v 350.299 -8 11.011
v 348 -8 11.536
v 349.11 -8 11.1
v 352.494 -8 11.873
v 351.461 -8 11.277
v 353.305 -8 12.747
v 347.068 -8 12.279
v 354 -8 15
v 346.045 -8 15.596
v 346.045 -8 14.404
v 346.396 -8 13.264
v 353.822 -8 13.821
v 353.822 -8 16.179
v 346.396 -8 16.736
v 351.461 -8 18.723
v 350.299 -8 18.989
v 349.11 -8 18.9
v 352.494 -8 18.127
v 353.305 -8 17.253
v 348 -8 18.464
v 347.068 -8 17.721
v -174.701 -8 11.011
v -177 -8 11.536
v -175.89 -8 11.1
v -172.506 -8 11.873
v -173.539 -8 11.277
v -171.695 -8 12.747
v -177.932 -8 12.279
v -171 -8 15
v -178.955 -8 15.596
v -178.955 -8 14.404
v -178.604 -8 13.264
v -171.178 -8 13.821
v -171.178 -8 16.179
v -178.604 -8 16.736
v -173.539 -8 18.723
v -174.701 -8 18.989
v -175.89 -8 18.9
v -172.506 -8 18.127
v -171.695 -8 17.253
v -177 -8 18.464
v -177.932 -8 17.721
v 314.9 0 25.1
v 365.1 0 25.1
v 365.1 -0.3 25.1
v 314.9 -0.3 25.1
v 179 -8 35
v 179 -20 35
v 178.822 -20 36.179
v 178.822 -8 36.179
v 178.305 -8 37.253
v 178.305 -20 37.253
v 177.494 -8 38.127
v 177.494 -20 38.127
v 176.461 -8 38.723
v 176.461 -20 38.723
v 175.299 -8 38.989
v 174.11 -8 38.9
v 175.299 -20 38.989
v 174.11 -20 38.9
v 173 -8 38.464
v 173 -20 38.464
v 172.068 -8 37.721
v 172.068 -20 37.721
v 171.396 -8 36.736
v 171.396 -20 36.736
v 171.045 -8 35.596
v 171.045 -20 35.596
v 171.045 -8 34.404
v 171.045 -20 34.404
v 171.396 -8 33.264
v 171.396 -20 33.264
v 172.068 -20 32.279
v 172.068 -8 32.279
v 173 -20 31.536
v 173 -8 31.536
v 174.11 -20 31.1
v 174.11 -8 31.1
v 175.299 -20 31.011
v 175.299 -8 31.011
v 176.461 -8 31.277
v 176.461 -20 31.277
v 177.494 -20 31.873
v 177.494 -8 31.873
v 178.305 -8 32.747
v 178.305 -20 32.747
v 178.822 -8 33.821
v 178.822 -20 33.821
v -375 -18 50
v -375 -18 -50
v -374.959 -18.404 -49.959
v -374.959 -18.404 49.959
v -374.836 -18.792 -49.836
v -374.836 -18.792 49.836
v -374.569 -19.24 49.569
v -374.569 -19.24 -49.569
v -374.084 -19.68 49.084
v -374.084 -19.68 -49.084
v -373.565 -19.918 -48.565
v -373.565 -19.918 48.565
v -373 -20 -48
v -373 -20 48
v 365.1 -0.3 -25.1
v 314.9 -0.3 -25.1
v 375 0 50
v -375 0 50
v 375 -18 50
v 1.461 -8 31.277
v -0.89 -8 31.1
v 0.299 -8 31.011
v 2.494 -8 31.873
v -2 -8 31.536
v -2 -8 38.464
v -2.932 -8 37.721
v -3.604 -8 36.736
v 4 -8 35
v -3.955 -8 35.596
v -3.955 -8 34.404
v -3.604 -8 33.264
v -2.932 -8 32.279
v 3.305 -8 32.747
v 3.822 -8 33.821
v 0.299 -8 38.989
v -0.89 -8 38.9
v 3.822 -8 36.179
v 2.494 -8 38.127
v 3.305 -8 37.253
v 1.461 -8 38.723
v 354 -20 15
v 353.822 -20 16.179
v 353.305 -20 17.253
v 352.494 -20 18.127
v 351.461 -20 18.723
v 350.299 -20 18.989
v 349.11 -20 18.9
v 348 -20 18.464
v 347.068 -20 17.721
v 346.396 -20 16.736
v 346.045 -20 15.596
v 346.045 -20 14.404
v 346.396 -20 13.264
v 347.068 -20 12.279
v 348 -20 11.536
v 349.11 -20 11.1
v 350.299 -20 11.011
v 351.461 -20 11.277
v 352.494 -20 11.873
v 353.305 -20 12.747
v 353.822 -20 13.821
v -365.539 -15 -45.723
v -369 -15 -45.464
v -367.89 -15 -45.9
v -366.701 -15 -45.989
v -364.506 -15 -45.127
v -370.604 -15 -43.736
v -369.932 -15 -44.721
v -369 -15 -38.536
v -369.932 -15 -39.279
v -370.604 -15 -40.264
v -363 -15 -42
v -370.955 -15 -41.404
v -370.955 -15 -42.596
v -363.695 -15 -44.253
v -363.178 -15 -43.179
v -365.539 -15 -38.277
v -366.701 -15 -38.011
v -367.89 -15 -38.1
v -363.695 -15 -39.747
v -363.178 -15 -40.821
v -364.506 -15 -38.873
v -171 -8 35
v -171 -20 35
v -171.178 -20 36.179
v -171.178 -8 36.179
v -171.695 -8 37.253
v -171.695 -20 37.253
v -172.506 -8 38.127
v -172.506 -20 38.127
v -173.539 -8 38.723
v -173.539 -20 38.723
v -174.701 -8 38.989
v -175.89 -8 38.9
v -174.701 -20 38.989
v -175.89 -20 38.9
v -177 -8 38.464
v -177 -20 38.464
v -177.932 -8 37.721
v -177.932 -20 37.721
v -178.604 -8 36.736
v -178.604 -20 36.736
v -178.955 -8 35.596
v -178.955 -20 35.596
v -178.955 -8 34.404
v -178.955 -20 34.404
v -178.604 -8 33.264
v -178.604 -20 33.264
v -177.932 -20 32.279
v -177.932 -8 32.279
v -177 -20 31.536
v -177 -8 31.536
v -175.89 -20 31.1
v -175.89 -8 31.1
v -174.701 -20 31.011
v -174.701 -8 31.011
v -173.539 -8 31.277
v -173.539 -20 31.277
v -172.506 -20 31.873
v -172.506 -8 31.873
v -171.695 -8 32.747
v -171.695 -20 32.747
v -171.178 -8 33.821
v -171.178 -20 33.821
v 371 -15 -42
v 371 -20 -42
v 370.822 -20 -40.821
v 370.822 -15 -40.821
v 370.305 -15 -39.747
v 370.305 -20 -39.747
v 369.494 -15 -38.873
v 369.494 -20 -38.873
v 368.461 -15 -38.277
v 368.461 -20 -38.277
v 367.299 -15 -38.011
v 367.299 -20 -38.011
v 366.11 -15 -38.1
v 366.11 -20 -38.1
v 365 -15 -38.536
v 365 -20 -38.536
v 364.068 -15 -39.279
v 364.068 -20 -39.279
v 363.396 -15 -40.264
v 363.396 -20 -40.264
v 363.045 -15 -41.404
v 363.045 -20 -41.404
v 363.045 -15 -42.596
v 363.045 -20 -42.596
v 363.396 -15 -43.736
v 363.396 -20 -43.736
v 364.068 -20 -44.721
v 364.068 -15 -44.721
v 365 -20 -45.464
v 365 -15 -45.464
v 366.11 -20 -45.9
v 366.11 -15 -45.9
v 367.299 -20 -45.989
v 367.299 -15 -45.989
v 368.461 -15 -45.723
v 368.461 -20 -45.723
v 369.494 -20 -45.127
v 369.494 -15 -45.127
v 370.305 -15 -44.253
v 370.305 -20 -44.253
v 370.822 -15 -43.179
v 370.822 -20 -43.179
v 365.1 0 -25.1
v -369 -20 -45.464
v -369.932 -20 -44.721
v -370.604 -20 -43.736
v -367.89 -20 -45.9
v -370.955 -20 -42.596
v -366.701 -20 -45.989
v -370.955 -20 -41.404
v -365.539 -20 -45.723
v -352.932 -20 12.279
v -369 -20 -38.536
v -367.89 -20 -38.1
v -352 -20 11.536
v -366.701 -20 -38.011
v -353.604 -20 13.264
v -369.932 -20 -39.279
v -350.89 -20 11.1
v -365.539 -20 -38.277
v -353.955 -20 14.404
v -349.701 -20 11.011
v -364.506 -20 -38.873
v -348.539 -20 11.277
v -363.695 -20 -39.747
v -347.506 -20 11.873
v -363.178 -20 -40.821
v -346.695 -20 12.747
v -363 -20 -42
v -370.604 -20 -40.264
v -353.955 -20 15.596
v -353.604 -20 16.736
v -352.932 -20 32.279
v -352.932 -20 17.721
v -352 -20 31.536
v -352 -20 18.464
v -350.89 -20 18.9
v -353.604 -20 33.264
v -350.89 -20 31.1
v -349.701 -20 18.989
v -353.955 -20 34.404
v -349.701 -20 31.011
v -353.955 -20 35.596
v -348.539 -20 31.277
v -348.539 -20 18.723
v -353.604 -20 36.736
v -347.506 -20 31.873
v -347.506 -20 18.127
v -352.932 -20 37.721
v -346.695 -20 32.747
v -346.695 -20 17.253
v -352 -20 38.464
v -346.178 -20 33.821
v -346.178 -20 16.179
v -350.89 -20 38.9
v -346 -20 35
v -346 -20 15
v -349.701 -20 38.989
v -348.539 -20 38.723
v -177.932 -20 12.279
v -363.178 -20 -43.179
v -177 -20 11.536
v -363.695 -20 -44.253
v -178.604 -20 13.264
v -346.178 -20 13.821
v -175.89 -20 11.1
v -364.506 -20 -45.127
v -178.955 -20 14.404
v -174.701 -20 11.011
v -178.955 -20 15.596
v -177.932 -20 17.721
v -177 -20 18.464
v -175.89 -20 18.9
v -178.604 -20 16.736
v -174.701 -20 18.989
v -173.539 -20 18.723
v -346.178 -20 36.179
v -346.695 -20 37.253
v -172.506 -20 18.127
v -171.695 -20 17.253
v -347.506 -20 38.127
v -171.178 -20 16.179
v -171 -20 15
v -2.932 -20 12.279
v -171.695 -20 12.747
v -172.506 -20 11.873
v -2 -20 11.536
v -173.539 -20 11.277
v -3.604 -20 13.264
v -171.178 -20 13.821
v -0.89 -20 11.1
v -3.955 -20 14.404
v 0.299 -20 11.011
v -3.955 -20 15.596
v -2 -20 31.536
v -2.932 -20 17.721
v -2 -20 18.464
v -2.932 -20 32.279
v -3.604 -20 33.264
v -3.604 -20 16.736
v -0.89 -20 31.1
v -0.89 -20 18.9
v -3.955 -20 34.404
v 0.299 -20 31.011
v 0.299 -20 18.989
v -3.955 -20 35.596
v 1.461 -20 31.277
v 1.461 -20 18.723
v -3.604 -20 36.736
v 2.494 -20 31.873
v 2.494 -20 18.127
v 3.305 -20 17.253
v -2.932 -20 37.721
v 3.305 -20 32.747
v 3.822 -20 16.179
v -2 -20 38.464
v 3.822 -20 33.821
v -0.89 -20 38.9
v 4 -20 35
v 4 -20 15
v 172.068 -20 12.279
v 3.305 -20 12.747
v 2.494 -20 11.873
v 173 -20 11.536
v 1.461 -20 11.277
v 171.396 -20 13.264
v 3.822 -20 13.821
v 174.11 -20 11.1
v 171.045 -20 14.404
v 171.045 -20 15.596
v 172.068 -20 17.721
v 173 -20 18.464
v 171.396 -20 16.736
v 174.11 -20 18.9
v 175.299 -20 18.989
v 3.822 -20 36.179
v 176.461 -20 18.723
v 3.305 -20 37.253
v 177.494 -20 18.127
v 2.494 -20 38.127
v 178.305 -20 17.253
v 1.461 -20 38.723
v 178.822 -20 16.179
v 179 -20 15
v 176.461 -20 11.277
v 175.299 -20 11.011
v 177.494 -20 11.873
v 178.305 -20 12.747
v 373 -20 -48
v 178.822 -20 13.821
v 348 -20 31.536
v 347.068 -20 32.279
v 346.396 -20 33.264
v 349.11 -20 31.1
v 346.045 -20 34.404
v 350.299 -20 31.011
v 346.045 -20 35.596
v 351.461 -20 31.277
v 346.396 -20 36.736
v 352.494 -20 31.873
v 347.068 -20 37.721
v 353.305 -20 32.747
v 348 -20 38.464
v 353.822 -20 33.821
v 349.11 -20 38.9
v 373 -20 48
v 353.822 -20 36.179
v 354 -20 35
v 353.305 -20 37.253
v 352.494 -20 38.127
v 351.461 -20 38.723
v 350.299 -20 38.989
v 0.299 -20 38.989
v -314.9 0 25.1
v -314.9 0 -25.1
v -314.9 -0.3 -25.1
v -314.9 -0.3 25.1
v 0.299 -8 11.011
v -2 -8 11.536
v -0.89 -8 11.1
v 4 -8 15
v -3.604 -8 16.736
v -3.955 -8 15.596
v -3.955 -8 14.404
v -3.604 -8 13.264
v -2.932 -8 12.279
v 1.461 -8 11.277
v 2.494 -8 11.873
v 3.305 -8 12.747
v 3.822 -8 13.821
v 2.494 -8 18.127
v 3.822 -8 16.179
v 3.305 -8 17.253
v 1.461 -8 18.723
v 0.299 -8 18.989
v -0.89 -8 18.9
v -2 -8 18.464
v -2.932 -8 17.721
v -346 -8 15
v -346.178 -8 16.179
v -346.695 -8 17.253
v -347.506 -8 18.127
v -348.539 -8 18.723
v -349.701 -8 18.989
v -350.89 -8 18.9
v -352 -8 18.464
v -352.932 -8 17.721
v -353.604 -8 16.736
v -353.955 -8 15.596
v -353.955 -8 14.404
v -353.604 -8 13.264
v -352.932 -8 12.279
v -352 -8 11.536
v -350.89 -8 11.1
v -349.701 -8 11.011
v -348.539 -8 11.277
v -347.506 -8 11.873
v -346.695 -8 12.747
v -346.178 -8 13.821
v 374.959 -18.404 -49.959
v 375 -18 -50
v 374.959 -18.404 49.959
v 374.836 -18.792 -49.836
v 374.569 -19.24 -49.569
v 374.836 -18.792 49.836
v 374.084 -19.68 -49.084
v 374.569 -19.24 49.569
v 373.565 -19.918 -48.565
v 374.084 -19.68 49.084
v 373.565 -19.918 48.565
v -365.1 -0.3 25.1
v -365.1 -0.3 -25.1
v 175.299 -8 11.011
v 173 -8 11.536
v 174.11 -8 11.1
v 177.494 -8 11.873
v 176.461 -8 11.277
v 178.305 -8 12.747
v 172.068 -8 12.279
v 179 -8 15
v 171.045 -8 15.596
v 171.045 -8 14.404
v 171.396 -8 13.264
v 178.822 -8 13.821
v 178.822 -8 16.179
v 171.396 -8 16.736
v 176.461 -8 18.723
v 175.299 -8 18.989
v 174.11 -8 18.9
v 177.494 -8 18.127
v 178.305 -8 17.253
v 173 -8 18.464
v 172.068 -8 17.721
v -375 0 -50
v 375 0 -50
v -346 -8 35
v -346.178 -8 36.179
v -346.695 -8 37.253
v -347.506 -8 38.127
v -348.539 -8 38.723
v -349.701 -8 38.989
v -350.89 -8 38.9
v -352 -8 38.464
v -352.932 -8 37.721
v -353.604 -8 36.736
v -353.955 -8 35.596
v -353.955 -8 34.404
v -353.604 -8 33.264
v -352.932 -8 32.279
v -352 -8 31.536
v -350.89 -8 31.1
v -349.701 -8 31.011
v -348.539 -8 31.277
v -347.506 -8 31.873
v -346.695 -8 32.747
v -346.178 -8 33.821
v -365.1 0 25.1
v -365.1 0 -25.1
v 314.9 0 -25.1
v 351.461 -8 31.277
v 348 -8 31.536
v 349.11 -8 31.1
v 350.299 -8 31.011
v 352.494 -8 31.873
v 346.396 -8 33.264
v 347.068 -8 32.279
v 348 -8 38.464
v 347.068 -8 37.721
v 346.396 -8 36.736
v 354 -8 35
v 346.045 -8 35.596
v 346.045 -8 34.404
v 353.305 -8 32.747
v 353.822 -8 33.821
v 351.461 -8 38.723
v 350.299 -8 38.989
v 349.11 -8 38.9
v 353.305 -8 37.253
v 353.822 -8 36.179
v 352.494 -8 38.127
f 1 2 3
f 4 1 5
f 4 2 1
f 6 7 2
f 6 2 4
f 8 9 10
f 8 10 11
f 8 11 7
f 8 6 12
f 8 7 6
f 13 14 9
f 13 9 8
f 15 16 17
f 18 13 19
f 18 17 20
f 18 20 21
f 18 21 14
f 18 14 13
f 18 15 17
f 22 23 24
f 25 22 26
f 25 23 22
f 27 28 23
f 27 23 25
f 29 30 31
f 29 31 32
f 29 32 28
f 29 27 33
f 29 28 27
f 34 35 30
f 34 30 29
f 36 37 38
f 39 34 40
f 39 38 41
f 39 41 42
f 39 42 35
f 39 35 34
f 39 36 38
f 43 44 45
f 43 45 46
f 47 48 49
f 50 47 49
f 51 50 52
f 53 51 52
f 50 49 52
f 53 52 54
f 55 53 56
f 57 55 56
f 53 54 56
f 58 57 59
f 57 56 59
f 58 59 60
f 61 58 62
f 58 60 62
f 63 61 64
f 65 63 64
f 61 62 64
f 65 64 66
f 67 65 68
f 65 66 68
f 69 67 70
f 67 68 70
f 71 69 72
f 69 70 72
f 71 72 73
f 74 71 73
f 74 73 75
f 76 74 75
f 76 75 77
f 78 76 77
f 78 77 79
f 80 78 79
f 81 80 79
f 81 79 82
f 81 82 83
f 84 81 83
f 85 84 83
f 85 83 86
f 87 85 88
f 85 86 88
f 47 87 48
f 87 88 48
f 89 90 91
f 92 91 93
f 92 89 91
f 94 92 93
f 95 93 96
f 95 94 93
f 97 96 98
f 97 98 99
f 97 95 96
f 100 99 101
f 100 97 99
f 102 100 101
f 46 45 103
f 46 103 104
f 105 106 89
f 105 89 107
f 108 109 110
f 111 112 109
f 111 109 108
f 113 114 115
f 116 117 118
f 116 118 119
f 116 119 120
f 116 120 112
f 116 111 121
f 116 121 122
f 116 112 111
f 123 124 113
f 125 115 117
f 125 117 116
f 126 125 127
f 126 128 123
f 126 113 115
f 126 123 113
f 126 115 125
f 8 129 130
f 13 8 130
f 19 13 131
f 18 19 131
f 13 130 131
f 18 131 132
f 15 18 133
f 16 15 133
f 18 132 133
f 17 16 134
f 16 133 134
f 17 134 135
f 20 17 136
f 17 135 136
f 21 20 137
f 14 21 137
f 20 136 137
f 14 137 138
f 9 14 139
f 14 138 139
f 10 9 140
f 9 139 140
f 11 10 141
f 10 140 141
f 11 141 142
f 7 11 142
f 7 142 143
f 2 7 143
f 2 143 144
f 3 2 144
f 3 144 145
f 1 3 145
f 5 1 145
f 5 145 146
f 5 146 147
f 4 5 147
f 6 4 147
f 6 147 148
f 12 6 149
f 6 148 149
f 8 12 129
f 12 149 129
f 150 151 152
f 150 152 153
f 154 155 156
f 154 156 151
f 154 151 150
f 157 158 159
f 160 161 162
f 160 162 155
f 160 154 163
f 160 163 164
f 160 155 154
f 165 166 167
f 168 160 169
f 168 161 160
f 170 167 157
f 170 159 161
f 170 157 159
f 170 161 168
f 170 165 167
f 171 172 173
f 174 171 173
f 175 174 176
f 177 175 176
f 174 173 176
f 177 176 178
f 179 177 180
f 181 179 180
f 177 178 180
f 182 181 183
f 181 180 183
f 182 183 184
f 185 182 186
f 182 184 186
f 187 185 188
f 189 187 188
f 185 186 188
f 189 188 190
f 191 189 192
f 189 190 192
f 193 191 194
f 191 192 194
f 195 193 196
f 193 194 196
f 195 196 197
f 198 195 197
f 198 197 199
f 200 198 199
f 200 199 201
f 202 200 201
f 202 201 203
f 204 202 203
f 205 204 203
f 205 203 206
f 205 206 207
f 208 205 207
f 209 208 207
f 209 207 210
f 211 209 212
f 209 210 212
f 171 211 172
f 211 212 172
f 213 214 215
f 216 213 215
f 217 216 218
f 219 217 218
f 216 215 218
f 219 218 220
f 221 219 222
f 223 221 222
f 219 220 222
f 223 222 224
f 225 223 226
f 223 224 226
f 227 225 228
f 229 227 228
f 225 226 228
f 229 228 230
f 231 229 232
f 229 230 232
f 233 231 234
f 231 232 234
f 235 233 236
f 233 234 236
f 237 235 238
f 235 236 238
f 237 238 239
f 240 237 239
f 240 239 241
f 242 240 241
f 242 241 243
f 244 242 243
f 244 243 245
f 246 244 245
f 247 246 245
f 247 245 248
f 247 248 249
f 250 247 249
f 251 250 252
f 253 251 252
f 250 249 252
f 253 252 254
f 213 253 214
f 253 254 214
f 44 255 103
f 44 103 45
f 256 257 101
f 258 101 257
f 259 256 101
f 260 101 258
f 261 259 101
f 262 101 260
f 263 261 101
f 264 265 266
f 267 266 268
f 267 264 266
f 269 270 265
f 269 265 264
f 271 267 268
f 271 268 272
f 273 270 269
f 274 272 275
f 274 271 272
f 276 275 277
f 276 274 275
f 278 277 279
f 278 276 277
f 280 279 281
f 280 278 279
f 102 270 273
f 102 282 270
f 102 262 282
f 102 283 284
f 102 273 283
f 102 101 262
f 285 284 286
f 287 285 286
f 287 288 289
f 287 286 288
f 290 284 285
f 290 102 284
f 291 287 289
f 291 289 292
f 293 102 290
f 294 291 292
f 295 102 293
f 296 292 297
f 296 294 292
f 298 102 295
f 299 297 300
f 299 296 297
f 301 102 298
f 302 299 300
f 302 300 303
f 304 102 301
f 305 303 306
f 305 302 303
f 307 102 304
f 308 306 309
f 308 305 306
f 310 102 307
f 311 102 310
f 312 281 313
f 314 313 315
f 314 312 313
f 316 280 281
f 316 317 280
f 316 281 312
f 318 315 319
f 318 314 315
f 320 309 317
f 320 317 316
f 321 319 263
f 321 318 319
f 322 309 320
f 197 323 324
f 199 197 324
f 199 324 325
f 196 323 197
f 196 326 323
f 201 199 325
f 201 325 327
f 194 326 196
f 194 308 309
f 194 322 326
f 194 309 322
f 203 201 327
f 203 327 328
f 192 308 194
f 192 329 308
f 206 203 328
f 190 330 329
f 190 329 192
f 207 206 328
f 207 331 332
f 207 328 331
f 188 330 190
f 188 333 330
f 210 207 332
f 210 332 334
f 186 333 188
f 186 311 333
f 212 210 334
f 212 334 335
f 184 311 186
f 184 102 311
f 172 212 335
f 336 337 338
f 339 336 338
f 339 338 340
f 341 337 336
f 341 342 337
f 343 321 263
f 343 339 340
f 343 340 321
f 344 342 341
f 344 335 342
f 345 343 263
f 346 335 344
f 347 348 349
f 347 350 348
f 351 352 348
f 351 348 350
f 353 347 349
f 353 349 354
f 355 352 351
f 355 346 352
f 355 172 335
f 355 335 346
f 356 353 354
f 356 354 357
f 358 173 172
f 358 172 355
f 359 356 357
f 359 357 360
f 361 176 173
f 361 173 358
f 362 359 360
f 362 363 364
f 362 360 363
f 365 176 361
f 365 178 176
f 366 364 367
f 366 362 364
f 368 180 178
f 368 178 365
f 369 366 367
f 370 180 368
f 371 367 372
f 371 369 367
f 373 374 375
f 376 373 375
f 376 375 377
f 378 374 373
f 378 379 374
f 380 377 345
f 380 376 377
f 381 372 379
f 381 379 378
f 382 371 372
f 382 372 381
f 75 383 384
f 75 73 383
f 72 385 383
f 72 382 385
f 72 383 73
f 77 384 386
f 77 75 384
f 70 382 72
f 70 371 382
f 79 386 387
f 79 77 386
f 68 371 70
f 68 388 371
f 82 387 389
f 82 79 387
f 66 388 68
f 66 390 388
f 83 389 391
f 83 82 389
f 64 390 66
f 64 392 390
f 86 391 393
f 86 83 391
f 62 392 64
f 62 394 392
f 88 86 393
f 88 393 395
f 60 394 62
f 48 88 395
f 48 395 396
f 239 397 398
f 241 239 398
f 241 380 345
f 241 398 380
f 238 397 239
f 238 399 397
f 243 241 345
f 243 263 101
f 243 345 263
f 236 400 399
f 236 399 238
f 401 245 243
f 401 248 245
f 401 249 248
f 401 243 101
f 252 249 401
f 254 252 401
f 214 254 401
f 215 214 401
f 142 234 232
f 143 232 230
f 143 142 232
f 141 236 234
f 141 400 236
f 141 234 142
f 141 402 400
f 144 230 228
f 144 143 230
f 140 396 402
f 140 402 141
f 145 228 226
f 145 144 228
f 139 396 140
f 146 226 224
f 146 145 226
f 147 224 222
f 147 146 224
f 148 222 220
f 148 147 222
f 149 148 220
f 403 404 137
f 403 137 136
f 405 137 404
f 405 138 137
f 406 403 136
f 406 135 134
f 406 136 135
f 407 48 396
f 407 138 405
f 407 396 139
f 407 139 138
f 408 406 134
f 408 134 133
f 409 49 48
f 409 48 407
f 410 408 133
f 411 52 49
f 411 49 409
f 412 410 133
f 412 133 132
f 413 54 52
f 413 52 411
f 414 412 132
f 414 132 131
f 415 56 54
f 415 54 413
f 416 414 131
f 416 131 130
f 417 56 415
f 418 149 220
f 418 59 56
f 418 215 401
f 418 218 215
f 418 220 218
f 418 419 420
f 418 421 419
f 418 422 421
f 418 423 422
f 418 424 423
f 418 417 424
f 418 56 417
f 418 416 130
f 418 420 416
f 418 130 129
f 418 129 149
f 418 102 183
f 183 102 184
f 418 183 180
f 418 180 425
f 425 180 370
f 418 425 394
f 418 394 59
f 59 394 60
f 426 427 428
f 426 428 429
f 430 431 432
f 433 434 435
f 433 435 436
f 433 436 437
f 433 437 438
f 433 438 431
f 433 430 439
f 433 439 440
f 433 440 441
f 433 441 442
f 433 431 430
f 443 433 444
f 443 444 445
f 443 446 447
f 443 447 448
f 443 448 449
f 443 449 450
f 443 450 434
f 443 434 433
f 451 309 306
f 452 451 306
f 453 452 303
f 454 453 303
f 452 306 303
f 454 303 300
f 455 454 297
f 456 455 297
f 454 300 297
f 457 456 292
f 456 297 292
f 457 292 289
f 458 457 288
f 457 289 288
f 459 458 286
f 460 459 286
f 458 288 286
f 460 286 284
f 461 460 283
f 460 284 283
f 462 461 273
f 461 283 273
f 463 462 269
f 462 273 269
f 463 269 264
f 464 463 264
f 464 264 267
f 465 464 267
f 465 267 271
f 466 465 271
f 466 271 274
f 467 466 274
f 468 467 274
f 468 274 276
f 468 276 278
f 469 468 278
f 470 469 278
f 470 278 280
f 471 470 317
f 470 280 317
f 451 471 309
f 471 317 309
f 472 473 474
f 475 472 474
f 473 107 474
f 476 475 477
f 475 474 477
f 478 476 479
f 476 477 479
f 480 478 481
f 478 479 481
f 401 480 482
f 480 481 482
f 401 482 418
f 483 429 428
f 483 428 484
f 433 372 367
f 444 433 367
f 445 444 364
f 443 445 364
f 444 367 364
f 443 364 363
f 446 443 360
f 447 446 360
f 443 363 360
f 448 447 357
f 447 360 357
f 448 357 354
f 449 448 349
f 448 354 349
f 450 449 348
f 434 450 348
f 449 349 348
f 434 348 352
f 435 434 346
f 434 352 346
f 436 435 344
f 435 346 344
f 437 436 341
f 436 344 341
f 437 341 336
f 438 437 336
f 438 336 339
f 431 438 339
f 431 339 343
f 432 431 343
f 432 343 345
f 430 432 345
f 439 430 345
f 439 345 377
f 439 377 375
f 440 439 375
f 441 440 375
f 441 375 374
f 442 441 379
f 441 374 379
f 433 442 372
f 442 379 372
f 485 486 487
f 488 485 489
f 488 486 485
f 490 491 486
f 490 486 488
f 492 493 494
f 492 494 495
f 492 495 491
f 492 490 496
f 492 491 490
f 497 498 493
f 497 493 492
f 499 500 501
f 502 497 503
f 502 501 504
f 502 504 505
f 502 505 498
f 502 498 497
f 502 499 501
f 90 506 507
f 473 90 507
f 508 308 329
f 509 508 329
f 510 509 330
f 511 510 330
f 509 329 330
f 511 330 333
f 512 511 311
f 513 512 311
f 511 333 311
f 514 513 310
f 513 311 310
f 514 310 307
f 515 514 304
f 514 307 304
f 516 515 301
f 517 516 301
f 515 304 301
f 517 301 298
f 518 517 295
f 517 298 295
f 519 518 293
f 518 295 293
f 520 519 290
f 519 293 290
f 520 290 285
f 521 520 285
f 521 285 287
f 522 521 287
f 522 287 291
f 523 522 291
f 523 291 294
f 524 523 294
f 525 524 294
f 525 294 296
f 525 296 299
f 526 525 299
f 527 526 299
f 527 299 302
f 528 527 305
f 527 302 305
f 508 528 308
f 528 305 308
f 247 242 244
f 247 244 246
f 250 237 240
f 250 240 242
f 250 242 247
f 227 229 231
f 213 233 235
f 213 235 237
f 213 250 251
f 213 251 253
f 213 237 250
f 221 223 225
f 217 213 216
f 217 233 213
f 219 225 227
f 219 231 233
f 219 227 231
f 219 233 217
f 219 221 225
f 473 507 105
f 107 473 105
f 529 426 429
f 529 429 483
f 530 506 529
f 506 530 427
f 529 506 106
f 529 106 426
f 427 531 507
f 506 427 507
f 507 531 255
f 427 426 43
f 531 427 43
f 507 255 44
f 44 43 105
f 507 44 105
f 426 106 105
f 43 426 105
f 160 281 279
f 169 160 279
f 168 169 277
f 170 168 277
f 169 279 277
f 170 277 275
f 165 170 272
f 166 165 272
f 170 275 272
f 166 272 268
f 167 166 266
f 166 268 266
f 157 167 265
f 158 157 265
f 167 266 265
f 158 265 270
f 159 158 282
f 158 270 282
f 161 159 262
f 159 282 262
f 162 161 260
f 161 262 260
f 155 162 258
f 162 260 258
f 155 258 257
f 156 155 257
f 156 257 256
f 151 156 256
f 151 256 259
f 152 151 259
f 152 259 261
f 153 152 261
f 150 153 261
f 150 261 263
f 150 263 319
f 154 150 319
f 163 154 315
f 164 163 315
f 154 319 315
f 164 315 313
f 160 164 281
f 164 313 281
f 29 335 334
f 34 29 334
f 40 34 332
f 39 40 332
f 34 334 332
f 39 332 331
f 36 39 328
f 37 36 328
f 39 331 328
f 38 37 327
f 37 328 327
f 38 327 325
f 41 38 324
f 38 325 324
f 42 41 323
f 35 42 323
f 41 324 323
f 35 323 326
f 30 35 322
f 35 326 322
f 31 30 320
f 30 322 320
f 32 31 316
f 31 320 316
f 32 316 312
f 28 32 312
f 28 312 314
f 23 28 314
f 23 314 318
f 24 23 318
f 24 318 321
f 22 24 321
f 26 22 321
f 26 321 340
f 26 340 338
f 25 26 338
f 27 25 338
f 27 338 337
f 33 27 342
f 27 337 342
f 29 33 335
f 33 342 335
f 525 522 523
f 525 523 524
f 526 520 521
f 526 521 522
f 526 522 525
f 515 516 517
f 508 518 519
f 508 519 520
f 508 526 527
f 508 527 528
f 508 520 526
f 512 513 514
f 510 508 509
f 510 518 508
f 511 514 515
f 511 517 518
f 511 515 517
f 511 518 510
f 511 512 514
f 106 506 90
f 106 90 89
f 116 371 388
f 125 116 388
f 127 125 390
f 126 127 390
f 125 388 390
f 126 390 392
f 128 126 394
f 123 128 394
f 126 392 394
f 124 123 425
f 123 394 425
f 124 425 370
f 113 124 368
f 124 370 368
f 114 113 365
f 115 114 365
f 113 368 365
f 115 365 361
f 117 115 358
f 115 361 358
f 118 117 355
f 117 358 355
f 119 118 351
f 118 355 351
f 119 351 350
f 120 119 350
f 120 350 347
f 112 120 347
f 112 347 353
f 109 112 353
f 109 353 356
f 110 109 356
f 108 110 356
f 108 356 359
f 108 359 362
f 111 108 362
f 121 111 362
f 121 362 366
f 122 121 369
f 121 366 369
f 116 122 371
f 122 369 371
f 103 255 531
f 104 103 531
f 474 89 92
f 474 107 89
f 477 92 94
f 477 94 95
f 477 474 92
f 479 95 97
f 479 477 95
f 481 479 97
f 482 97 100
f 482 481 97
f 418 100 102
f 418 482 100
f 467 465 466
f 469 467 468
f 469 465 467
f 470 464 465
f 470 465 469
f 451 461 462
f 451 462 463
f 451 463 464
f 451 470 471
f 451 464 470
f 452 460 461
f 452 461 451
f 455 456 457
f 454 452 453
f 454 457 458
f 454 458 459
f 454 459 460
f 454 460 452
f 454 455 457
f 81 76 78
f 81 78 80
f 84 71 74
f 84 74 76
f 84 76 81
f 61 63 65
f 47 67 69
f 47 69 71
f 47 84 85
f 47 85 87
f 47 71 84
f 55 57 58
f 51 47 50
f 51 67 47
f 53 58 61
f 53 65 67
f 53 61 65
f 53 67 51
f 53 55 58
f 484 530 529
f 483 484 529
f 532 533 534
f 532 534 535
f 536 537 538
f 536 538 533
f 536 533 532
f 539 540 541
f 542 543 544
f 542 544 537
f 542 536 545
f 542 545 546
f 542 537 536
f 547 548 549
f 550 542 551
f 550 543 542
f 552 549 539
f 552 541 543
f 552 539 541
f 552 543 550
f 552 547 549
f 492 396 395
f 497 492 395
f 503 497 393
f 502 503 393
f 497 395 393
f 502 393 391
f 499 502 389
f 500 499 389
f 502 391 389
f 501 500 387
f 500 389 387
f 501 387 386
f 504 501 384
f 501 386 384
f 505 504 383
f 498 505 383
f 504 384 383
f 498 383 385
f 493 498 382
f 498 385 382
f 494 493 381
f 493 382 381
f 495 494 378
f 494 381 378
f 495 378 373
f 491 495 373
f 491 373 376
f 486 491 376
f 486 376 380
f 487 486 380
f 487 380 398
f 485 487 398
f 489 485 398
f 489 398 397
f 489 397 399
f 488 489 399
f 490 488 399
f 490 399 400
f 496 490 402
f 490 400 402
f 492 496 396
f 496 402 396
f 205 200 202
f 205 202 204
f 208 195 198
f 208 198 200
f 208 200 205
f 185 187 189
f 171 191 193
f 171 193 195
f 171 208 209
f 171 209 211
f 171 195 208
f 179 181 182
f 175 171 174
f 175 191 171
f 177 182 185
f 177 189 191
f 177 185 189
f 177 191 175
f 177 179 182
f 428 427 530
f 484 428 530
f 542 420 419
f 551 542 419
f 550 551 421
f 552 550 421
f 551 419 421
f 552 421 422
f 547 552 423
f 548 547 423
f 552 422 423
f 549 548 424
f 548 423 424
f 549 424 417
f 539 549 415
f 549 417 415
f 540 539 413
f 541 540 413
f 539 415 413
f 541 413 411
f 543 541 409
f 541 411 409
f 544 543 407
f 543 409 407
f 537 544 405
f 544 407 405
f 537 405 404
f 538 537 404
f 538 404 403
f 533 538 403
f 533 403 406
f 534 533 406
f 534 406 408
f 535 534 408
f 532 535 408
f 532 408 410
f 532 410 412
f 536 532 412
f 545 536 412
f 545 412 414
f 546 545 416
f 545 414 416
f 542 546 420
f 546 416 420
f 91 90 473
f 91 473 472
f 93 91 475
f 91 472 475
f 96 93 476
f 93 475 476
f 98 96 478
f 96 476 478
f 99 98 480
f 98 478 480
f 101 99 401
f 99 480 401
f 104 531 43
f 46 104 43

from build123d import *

# Parameters (mm, degrees)
F0_W     = 750
F0_H     = 100
F1_DEPTH = 20
F2_R     = 2
F3_R     = 4
F4_DEPTH = 12
F5_R     = 4
F6_DEPTH = 5
F7_W     = 50.2
F7_H     = 50.2
F8_DEPTH = 0.3


with BuildPart() as f1:
    # F0 (on Front) → F1 (new body)
    with BuildSketch(Plane.XZ):
        Rectangle(F0_W, F0_H)
    extrude(amount=F1_DEPTH)

    # F2
    f2_edges = [f1.edges().sort_by_distance(p)[0] for p in [
        (0, -20, -50),
        (375, -20, 0),
        (0, -20, 50),
        (-375, -20, 0),
    ]]
    fillet(f2_edges, radius=F2_R)

    # F3 (on face) → F4 (cut)
    with BuildSketch(Plane.XZ.offset(20)):
        with Locations((-350, 35)):
            Circle(F3_R)
        with Locations((-350, 15)):
            Circle(F3_R)
        with Locations((-175, 15)):
            Circle(F3_R)
        with Locations((-175, 35)):
            Circle(F3_R)
        with Locations((0, 35)):
            Circle(F3_R)
        with Locations((0, 15)):
            Circle(F3_R)
        with Locations((175, 35)):
            Circle(F3_R)
        with Locations((175, 15)):
            Circle(F3_R)
        with Locations((350, 15)):
            Circle(F3_R)
        with Locations((350, 35)):
            Circle(F3_R)
    extrude(amount=-F4_DEPTH, mode=Mode.SUBTRACT)

    # F5 (on face) → F6 (cut)
    with BuildSketch(Plane.XZ.offset(20)):
        with Locations((-367, -42)):
            Circle(F5_R)
        with Locations((367, -42)):
            Circle(F5_R)
    extrude(amount=-F6_DEPTH, mode=Mode.SUBTRACT)

    # F7 (on face) → F8 (cut)
    with BuildSketch(Plane(origin=(0, 0, 0), x_dir=(-1, 0, 0), z_dir=(0, 1, 0))):
        with Locations((-340, 0)):
            Rectangle(F7_W, F7_H)
        with Locations((340, 0)):
            Rectangle(F7_W, F7_H)
    extrude(amount=-F8_DEPTH, mode=Mode.SUBTRACT)


solid = f1.part
